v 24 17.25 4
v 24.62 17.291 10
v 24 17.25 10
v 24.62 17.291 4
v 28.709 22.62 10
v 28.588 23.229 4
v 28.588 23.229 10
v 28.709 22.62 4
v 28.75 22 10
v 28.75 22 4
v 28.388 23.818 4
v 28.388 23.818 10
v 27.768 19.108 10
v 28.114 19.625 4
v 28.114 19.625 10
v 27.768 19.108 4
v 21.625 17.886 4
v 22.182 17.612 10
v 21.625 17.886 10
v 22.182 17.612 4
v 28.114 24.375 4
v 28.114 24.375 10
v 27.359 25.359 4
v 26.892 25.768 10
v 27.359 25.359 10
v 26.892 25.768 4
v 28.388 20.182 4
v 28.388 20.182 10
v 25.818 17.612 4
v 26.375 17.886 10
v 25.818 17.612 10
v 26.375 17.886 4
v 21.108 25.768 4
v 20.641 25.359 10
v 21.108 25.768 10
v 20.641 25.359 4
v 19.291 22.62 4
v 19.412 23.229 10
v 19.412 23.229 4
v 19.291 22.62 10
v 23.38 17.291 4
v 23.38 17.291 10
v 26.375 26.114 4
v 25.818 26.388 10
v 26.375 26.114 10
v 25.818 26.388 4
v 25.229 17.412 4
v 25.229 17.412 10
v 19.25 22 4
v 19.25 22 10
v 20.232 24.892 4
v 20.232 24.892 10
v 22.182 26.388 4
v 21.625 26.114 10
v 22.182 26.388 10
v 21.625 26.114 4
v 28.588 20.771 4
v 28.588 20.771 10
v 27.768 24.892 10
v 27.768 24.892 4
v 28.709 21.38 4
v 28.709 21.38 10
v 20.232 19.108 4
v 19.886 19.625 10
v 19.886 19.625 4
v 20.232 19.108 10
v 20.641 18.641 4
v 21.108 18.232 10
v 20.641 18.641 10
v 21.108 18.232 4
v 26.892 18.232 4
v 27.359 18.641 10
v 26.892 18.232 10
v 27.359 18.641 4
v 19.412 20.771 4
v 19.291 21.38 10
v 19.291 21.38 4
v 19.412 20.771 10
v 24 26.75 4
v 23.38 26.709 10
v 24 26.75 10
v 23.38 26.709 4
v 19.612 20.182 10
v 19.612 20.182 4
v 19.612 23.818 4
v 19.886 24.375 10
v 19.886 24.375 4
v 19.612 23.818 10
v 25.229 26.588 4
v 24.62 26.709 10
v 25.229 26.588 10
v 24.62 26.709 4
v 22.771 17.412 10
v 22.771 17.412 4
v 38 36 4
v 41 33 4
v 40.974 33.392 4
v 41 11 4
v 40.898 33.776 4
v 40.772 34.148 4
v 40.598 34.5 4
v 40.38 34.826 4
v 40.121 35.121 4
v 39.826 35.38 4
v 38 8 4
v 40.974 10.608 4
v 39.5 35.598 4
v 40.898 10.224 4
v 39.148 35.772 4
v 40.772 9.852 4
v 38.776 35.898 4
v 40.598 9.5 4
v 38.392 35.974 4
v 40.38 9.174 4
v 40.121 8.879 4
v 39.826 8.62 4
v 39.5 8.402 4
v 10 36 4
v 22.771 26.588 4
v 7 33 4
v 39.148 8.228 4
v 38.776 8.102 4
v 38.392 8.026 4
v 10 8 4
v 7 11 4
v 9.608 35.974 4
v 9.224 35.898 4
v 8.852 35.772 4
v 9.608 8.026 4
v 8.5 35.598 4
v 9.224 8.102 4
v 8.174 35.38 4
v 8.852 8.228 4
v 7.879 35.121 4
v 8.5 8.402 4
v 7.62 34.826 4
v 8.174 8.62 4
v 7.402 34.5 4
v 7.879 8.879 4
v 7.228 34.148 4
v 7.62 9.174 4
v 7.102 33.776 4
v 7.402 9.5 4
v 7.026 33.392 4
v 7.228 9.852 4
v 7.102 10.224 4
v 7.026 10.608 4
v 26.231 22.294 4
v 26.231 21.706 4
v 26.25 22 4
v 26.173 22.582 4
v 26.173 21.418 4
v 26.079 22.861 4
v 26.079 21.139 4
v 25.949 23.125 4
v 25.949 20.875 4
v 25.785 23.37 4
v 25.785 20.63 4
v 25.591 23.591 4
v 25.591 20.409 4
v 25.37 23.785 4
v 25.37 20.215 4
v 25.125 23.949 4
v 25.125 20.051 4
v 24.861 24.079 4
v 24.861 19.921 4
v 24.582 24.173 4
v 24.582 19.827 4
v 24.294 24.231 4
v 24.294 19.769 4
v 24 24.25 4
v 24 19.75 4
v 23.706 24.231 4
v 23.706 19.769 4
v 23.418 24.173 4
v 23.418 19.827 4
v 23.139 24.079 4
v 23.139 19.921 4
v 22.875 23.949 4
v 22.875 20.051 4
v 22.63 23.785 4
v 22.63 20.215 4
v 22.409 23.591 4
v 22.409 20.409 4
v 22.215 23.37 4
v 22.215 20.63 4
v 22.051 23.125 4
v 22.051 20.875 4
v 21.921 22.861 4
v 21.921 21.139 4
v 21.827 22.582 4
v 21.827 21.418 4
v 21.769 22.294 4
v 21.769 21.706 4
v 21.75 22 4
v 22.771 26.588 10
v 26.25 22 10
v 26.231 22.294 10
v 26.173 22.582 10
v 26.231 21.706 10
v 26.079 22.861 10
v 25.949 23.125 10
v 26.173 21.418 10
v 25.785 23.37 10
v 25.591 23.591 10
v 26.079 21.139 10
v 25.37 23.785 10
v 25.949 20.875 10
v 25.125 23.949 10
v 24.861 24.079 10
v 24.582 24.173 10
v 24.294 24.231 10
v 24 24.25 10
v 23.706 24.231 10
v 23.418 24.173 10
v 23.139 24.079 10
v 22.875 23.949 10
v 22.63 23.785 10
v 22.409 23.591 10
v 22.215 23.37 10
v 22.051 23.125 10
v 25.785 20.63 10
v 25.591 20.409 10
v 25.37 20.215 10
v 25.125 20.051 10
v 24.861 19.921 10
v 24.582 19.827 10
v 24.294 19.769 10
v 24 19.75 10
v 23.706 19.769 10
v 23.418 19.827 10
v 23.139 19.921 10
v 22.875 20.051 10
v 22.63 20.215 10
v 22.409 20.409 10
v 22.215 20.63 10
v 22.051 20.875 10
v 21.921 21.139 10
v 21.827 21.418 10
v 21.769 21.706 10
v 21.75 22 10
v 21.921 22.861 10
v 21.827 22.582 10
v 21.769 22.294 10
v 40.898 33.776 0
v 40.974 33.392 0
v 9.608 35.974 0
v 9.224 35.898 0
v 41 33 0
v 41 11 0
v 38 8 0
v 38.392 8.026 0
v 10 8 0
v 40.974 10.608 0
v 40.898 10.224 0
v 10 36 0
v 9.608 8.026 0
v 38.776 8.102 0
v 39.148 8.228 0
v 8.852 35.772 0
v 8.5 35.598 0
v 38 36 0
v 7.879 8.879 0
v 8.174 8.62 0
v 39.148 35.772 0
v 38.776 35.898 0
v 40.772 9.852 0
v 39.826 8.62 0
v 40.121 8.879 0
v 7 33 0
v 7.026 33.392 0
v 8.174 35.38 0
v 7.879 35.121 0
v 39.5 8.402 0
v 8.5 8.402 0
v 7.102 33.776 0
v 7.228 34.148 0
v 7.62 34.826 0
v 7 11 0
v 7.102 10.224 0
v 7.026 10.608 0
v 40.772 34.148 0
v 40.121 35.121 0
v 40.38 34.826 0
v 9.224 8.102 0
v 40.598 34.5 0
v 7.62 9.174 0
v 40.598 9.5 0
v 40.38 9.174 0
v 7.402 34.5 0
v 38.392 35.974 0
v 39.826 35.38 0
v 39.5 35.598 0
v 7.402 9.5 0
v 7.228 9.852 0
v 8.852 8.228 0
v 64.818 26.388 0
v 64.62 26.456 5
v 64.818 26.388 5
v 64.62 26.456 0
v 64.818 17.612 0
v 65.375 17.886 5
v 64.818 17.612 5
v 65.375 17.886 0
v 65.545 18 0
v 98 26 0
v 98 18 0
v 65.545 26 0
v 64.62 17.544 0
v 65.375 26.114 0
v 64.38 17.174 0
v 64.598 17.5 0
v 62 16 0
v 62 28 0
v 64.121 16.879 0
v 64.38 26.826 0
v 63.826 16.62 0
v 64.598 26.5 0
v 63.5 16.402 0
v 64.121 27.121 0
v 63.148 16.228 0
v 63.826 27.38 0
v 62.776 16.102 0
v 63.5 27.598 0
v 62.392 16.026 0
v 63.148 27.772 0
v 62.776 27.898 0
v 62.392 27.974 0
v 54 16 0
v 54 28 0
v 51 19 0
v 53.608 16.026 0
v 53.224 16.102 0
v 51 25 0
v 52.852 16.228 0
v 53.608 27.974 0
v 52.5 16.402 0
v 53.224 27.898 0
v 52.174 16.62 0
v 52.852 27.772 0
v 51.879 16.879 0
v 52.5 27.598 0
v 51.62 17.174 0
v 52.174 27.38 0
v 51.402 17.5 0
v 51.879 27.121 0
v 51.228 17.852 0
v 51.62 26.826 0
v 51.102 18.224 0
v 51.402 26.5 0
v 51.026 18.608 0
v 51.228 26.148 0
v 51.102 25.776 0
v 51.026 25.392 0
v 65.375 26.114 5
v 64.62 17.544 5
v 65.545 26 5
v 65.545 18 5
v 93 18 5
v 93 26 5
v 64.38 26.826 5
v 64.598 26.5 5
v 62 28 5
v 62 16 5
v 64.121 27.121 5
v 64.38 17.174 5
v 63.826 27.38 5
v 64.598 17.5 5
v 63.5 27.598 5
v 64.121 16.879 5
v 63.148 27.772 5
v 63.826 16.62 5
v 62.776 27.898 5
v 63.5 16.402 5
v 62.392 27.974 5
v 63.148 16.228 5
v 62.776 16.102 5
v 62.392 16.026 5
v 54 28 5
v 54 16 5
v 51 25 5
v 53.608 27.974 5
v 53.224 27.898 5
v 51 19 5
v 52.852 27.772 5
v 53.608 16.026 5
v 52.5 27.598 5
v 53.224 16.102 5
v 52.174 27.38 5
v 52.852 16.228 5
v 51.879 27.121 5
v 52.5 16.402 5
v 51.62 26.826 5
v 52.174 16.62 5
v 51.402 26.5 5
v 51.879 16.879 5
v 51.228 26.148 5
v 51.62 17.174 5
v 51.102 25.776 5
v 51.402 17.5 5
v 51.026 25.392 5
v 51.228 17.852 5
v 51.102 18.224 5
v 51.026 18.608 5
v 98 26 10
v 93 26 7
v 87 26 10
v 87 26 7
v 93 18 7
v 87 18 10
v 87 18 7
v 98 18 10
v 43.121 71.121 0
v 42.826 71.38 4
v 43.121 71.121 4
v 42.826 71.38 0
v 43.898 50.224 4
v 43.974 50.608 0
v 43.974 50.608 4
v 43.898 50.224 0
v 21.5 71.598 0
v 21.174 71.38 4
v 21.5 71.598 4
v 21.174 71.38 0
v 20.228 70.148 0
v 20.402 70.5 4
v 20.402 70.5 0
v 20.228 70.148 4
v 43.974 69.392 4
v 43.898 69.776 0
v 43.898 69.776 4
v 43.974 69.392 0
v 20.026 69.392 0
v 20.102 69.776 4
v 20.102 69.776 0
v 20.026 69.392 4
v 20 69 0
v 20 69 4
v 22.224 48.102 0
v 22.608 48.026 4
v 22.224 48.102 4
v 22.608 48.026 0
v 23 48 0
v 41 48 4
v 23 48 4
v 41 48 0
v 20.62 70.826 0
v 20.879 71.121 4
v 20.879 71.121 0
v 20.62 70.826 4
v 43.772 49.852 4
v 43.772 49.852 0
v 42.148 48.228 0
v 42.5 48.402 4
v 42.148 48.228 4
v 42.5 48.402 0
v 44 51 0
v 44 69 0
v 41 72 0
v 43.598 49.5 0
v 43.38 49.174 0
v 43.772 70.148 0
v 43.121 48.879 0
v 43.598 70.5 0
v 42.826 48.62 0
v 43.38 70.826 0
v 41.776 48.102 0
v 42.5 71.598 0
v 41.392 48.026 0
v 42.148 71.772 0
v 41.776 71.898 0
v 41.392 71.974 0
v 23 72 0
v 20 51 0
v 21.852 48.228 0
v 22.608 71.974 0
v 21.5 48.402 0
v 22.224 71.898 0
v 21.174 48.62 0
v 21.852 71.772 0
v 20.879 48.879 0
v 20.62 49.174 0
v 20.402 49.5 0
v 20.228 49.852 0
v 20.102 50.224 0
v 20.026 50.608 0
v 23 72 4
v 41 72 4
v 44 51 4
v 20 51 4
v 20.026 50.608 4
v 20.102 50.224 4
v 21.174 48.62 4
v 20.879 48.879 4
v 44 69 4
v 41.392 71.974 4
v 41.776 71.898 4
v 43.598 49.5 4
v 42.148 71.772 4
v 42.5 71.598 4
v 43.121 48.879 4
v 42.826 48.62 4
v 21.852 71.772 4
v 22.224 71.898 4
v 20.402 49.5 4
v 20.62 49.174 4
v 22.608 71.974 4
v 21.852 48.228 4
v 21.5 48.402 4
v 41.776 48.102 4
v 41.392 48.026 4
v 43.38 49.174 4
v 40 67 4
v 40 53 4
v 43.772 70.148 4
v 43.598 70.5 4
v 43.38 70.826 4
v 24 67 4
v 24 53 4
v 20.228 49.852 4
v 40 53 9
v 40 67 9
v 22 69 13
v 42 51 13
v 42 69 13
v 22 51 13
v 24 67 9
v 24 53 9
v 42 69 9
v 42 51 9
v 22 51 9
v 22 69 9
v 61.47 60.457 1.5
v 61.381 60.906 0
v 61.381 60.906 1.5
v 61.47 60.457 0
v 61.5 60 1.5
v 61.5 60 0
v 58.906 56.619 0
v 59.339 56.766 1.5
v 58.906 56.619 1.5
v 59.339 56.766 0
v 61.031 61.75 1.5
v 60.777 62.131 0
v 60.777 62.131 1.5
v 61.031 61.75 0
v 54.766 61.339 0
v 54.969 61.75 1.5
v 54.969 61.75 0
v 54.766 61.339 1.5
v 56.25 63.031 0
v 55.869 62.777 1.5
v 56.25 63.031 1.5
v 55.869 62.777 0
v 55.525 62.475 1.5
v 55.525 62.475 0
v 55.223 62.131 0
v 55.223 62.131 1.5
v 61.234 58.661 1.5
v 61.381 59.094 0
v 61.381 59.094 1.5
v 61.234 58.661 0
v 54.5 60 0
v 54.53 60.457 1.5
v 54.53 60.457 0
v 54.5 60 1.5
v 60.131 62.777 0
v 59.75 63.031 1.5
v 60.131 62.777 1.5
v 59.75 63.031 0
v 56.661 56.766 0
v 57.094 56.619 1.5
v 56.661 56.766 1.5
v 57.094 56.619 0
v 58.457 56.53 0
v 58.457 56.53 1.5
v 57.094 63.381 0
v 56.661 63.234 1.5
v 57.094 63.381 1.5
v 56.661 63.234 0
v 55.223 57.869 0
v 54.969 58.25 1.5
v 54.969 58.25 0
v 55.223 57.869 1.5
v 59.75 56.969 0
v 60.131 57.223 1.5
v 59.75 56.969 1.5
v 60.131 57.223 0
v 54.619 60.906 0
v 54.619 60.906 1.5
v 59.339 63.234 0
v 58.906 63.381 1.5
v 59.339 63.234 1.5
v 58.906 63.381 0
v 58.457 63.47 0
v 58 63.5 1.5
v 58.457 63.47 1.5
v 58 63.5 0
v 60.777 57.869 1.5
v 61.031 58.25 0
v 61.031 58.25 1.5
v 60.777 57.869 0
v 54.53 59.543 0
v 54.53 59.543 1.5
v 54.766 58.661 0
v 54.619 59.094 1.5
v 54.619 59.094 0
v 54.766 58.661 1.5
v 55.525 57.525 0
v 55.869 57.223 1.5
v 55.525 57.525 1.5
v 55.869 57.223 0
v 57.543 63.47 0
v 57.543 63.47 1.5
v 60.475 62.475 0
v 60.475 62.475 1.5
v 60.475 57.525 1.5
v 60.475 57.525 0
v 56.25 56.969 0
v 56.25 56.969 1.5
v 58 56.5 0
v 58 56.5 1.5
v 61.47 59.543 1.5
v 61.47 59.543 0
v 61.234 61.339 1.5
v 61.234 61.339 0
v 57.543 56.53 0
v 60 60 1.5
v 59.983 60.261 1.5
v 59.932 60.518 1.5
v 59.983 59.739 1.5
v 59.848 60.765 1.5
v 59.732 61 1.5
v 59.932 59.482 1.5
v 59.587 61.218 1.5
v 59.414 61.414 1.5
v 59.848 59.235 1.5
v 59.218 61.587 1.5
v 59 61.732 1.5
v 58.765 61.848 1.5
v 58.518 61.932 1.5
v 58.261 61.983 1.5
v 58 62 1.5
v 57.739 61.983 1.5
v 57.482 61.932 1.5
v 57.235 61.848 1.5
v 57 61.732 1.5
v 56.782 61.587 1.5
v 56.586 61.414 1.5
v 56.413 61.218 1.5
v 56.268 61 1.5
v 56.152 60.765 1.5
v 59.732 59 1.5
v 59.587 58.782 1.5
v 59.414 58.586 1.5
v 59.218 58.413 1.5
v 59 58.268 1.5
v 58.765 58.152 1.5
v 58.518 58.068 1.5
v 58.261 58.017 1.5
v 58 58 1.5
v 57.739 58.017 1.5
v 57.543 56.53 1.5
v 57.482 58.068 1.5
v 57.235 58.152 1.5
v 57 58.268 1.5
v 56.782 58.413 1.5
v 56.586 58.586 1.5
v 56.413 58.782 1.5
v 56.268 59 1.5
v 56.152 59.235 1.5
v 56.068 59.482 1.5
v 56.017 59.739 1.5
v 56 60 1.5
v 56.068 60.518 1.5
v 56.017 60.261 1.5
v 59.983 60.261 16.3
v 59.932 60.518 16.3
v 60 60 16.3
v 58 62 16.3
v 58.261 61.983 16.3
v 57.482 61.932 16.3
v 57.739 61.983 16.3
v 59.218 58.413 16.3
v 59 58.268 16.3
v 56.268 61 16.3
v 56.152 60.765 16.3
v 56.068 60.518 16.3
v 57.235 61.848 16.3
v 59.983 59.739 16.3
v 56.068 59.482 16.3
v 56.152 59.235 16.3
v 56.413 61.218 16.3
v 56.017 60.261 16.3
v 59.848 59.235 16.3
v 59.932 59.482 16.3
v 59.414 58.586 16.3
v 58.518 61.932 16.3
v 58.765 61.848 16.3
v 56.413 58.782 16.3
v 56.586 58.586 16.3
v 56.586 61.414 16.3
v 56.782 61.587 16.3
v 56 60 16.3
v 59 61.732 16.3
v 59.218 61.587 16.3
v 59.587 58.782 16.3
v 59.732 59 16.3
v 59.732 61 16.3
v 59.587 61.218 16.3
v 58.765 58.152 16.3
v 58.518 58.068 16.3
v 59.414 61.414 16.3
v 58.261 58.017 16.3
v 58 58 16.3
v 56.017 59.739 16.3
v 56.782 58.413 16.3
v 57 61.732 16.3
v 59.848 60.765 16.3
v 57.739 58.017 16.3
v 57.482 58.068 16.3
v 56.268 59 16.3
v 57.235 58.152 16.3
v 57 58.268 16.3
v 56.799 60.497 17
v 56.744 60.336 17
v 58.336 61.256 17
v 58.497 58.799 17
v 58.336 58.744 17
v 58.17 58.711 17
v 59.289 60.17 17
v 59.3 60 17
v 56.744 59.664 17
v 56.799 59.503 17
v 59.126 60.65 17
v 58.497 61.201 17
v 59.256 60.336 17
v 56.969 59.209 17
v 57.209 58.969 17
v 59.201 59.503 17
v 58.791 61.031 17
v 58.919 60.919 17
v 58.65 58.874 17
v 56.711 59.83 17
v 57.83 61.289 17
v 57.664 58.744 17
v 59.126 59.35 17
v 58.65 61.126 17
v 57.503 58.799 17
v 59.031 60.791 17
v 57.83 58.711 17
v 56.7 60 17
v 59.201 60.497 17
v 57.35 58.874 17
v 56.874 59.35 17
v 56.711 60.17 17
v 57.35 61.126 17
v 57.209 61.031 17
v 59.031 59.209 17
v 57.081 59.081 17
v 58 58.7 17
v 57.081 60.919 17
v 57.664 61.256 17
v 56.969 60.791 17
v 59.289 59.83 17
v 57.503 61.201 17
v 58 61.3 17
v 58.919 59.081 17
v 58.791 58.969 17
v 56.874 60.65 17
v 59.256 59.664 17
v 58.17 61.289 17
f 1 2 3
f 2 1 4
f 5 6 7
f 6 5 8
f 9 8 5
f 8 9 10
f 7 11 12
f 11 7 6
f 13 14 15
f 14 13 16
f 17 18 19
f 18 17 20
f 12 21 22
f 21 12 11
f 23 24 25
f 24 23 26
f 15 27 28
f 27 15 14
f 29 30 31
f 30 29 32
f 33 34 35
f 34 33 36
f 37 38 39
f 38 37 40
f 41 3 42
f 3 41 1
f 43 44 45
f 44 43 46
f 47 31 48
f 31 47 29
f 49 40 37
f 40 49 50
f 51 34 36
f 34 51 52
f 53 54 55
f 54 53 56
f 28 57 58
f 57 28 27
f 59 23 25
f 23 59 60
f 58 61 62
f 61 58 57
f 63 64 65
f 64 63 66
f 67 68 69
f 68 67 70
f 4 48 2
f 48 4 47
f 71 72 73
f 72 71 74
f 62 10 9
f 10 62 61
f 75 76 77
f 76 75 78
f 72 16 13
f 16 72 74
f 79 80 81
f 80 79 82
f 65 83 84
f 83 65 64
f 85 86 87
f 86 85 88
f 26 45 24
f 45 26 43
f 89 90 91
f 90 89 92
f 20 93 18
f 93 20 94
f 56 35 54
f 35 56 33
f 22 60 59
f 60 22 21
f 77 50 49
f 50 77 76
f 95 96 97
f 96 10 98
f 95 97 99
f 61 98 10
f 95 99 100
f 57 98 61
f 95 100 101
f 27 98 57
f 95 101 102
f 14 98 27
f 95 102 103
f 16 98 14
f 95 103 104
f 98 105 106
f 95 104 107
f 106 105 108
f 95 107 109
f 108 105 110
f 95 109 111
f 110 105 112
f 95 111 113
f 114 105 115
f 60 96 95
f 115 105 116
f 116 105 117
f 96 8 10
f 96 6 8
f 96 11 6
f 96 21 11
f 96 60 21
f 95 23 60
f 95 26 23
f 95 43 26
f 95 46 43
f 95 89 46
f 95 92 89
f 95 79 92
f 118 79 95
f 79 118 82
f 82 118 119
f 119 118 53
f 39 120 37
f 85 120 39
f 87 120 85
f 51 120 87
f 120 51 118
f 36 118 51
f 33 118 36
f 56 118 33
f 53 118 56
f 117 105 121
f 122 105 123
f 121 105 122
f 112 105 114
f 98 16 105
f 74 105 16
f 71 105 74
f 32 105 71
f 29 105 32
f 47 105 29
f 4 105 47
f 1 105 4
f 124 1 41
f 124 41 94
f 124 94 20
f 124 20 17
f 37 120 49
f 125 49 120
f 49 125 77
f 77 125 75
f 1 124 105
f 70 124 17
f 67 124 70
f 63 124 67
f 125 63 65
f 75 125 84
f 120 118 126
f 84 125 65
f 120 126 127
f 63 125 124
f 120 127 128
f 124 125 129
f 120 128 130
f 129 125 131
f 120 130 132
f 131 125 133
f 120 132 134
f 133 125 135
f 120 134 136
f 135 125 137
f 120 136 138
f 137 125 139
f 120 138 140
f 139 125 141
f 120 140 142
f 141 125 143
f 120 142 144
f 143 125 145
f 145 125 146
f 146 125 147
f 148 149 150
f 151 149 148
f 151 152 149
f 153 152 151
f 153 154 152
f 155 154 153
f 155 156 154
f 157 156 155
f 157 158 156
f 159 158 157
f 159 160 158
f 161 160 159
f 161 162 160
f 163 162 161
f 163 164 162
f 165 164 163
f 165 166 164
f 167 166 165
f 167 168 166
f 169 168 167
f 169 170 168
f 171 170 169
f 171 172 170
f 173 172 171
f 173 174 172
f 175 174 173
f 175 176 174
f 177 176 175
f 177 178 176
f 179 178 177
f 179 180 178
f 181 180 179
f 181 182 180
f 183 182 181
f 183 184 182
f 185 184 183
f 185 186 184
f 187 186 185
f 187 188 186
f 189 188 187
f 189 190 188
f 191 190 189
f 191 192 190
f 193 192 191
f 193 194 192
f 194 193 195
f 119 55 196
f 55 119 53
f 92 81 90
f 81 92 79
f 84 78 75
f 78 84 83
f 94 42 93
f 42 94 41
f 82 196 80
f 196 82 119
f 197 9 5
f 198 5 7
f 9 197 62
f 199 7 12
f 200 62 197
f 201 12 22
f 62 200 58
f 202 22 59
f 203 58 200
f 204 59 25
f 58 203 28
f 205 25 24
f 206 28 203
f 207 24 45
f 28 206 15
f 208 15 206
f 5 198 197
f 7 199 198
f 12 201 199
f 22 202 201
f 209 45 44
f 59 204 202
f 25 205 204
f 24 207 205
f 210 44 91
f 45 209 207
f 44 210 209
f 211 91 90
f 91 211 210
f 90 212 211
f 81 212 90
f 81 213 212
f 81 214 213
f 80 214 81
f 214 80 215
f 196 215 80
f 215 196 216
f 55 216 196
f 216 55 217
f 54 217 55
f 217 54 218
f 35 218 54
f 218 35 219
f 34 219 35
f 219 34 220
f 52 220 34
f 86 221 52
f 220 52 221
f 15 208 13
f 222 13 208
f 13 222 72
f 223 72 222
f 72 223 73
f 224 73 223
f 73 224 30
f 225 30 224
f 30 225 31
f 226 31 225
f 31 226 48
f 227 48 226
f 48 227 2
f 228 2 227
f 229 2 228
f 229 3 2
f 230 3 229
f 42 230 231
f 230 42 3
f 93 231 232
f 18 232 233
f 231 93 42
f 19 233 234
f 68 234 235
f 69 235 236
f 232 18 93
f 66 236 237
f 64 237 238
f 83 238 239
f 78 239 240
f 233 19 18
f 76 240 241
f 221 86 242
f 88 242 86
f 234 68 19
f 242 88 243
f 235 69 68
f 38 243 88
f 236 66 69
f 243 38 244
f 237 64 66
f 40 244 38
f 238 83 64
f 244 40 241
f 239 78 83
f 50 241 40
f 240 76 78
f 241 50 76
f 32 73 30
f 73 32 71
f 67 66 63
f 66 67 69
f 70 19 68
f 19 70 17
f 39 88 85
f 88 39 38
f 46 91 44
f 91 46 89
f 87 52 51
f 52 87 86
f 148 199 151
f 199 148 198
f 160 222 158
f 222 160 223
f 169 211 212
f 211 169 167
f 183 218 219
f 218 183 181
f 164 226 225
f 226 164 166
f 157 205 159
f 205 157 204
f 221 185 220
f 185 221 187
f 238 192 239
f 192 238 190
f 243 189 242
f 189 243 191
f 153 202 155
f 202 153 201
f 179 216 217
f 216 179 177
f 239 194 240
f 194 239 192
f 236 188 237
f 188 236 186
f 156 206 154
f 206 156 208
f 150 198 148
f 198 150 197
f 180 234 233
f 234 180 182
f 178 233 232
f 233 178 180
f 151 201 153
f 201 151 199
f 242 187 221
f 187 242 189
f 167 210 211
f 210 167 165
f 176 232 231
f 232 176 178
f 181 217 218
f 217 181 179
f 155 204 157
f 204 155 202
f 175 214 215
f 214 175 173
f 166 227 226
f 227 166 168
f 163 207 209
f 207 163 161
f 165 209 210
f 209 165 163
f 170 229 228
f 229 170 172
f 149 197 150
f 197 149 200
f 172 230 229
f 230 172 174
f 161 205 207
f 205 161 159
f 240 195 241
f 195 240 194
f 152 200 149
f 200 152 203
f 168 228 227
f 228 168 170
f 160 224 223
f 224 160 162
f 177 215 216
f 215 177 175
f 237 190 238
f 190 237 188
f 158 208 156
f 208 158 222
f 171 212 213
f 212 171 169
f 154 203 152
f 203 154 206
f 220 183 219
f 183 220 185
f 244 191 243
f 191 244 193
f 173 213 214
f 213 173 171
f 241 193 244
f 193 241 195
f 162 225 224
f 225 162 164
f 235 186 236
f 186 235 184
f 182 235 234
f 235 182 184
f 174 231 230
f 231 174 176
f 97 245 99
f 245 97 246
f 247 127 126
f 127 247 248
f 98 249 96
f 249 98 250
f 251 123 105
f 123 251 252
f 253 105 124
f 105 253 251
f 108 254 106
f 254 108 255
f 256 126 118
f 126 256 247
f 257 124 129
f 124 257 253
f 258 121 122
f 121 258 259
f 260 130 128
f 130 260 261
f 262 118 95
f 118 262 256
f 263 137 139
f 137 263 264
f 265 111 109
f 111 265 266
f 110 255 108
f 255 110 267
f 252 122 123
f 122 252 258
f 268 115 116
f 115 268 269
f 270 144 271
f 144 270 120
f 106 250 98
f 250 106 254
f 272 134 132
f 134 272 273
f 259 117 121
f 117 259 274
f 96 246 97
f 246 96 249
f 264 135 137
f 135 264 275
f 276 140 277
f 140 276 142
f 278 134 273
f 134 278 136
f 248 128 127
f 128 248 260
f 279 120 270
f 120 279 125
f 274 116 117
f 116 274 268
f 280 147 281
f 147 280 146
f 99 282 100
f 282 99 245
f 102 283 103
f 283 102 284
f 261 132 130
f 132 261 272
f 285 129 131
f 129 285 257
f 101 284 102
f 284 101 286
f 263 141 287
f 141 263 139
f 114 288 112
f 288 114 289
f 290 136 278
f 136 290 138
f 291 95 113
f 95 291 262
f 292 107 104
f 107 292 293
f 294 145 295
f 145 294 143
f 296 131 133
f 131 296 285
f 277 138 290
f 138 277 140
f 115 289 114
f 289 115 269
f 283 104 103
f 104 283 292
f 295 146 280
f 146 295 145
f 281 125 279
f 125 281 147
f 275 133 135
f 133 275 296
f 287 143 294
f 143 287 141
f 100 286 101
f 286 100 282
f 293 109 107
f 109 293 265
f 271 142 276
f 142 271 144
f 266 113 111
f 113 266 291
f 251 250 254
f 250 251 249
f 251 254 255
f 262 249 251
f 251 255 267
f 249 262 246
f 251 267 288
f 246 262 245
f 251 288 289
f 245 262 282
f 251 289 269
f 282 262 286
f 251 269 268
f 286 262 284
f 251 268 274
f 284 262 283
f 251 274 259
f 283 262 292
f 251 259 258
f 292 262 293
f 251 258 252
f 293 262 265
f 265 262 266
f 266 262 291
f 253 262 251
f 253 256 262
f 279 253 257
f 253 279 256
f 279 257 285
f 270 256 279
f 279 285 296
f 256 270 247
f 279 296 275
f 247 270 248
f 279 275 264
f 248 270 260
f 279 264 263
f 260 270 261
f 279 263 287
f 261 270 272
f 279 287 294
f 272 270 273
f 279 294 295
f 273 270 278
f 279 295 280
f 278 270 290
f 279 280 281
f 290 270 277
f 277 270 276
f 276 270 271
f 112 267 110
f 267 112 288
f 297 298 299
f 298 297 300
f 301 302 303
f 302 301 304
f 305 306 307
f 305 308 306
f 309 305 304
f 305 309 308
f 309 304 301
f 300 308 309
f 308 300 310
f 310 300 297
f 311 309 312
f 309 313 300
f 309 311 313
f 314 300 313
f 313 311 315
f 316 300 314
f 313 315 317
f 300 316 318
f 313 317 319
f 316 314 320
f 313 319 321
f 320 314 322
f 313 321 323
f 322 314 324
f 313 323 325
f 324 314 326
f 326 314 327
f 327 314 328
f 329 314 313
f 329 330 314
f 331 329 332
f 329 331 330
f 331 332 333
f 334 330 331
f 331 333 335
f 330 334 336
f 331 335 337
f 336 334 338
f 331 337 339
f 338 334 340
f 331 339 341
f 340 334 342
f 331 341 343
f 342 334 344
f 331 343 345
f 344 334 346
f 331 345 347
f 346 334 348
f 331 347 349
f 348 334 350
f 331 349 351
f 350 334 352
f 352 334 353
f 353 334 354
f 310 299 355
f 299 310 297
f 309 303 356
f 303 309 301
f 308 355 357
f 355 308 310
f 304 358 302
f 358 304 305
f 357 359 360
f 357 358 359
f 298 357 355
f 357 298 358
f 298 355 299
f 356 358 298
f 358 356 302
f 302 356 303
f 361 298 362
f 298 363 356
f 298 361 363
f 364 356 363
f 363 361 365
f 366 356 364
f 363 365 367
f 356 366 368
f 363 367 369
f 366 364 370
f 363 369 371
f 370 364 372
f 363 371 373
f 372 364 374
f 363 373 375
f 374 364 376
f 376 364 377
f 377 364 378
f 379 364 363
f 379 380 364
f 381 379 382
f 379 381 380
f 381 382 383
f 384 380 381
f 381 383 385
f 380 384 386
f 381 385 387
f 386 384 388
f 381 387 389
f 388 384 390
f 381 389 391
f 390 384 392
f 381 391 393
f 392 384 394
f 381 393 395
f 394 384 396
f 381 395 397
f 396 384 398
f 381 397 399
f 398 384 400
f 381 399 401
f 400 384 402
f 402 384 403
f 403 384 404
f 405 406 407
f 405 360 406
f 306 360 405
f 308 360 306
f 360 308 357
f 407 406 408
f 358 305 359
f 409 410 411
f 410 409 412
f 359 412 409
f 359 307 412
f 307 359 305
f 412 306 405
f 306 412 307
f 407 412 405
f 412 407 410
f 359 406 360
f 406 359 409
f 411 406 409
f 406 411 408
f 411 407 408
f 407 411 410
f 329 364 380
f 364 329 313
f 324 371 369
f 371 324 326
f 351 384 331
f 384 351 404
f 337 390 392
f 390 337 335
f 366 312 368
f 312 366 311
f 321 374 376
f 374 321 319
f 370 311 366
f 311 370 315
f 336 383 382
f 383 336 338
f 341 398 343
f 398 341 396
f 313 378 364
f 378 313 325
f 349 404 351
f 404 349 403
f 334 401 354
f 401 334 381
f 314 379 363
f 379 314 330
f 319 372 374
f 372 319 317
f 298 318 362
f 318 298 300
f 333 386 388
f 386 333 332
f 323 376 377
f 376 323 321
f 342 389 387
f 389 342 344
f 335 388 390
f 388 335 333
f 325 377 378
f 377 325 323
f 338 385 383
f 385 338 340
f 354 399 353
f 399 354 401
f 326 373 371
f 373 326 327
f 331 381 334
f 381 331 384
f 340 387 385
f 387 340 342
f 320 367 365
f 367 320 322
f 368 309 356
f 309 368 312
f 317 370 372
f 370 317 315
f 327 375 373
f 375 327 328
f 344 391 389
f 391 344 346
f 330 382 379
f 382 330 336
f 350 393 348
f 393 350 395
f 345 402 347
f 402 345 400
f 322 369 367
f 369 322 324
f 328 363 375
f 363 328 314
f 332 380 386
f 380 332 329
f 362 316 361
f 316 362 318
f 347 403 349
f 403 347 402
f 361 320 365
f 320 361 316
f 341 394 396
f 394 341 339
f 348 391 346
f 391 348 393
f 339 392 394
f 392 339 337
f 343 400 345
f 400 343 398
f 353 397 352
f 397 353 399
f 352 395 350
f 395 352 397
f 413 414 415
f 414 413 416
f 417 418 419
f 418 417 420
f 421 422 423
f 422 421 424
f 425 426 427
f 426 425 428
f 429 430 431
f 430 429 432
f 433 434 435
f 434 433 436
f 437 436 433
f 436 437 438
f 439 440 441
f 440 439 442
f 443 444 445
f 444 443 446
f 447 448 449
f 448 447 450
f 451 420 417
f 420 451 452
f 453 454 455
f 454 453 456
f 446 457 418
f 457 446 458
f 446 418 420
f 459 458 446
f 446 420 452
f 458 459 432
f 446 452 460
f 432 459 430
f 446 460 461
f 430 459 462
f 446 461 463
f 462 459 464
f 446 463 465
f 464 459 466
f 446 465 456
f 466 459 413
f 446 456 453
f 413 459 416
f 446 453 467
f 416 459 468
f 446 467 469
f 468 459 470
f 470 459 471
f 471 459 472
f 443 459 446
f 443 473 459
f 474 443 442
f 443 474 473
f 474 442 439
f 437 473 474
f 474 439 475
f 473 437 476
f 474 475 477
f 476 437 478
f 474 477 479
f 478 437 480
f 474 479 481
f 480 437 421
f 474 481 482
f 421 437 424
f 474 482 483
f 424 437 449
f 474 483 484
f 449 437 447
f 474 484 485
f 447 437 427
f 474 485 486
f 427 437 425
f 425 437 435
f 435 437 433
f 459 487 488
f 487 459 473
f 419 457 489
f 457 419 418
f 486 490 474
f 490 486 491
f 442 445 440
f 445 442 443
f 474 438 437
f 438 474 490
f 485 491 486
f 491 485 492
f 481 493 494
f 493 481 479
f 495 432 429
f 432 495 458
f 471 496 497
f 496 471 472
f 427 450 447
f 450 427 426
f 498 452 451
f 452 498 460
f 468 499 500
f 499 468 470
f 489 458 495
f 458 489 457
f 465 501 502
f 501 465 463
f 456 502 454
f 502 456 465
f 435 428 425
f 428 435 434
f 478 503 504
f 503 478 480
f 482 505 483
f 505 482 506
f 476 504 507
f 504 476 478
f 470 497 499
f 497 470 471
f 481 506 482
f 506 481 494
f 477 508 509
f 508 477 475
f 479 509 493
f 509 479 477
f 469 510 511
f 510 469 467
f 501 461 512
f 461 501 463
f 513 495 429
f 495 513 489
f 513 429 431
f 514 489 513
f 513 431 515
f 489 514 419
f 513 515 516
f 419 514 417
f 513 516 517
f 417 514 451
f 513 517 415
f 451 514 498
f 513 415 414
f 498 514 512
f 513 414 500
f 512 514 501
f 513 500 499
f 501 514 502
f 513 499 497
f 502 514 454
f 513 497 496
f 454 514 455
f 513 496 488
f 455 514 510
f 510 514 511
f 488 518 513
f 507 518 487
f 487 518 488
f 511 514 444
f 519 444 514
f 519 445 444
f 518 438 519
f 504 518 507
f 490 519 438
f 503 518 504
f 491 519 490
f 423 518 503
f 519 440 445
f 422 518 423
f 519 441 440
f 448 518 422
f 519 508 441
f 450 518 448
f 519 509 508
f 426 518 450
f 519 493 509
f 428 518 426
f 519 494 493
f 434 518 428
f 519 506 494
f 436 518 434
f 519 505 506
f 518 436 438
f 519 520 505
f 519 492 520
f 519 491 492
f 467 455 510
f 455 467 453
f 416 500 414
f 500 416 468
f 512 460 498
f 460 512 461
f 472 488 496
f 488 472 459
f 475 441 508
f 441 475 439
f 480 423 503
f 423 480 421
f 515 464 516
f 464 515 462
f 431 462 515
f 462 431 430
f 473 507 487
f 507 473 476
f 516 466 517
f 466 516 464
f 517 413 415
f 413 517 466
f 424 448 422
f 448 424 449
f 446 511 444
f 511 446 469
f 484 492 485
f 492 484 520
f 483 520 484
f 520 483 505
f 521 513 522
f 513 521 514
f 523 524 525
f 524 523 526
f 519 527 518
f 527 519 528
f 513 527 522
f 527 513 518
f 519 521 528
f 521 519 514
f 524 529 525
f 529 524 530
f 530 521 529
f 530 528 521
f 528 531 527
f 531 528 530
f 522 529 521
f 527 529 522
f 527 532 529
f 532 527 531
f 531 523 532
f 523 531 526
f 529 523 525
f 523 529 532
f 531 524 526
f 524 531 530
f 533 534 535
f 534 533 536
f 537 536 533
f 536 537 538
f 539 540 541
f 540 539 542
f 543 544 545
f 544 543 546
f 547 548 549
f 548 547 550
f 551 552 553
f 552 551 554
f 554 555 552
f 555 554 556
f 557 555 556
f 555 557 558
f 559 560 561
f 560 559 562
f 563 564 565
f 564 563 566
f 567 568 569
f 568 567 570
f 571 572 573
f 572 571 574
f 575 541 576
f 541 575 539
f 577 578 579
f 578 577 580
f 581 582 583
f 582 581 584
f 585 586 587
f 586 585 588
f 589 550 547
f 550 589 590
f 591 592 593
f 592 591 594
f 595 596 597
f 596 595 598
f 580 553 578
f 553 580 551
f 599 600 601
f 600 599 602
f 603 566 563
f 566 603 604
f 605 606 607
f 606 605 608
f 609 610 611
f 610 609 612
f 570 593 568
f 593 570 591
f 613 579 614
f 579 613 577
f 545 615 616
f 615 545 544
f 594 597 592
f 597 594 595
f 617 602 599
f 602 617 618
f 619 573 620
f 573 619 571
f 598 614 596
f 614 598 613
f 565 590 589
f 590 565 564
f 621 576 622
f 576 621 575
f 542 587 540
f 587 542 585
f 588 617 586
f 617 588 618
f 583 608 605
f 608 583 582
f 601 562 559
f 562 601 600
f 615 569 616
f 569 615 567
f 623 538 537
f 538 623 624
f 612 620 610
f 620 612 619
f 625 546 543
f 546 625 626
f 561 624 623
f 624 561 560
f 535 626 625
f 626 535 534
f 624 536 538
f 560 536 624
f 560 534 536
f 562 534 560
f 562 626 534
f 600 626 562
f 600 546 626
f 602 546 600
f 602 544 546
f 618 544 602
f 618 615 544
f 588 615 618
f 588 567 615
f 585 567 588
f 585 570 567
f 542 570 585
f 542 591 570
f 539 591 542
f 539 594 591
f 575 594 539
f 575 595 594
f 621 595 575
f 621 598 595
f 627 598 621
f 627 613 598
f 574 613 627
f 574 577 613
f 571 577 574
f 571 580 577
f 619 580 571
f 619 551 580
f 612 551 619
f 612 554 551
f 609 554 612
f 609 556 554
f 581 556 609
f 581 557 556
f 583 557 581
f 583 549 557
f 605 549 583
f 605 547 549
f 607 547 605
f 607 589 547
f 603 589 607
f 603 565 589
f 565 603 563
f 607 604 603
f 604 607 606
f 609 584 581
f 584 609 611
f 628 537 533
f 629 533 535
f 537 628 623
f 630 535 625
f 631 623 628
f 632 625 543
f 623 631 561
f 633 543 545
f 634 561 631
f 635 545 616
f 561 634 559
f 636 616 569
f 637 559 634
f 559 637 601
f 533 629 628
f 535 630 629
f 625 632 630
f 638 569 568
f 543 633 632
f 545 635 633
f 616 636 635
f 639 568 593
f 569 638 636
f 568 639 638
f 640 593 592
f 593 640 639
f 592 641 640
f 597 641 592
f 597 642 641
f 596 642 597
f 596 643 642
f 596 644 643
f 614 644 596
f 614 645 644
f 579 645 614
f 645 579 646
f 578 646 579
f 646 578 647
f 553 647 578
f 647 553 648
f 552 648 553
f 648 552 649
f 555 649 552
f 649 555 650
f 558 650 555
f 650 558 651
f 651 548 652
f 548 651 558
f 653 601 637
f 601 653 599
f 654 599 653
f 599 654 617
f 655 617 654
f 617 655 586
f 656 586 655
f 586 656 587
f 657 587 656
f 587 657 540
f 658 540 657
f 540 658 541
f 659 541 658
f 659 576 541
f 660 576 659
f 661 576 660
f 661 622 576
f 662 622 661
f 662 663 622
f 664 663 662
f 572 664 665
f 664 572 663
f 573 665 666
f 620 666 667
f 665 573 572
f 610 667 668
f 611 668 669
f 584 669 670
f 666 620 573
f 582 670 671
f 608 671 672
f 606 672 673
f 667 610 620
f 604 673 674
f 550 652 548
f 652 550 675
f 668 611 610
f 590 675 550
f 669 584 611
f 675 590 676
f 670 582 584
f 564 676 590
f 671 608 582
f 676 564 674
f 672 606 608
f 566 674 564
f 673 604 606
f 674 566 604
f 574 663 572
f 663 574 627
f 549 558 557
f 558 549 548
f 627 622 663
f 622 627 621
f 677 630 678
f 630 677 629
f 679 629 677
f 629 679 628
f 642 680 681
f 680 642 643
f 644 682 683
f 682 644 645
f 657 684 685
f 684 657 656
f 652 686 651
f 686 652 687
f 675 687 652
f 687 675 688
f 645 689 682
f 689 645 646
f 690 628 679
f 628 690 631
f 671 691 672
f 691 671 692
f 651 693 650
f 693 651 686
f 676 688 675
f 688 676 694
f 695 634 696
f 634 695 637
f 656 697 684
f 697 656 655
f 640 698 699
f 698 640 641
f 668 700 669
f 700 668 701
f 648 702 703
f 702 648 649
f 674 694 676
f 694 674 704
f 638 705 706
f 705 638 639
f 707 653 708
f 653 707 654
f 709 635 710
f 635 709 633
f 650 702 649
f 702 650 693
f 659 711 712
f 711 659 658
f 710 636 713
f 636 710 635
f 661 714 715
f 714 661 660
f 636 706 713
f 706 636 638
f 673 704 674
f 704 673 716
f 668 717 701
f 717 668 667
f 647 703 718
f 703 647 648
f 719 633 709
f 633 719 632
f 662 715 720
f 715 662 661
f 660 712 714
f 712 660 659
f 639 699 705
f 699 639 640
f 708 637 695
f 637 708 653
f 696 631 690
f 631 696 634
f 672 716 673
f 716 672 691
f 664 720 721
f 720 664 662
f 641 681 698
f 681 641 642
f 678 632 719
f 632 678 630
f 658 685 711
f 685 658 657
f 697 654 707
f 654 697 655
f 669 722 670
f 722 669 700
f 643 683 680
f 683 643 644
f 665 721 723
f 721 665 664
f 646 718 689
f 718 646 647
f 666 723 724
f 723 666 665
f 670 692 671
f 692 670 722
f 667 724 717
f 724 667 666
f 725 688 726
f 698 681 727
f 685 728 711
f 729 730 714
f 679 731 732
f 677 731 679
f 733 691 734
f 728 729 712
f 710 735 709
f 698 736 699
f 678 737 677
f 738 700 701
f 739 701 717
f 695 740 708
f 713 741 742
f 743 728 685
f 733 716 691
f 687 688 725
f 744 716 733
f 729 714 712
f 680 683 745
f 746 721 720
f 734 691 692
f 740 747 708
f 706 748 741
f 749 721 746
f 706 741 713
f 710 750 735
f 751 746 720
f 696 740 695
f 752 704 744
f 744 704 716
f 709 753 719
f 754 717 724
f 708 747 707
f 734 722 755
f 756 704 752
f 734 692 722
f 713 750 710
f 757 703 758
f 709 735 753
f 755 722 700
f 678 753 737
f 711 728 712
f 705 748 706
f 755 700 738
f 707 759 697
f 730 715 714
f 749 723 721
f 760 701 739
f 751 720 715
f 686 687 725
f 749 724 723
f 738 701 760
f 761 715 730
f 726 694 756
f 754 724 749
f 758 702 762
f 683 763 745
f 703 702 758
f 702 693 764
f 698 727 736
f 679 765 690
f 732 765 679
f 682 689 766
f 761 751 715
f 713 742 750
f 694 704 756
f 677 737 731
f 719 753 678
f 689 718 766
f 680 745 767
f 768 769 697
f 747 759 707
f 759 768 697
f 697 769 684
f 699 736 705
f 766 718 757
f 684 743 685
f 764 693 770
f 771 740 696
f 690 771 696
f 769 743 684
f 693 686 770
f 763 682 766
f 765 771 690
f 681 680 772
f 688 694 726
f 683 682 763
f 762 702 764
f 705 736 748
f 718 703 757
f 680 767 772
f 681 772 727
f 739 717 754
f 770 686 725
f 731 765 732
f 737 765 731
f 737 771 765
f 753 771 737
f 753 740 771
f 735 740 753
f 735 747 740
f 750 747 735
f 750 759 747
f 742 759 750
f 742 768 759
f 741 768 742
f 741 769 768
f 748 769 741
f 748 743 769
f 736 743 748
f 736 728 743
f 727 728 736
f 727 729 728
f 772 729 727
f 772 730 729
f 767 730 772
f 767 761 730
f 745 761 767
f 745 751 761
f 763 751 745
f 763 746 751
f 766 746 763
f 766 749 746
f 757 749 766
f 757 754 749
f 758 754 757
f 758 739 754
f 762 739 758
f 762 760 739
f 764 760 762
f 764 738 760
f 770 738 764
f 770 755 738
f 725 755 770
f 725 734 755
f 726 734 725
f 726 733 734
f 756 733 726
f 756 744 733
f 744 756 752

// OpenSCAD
/*
Sample 074: Drehhakenverschluss — 0,25 mm
Generated from the FDM Mechanical Sample Library.
Units: millimetres.

Override examples:
  openscad -o custom.stl -D 'view="plate"' -D 'render_fn=64' model.scad
  openscad -o preview.png -D 'view="assembly"' model.scad
*/
use <../../../library/fdm_mechanisms.scad>

render_fn = is_undef(render_fn) ? 48 : render_fn;
view = is_undef(view) ? "plate" : view;
$fn = render_fn;

sample_hook_latch(
    view=view,
    pin_d=4,
    clearance=0.25,
    arm=34
);
